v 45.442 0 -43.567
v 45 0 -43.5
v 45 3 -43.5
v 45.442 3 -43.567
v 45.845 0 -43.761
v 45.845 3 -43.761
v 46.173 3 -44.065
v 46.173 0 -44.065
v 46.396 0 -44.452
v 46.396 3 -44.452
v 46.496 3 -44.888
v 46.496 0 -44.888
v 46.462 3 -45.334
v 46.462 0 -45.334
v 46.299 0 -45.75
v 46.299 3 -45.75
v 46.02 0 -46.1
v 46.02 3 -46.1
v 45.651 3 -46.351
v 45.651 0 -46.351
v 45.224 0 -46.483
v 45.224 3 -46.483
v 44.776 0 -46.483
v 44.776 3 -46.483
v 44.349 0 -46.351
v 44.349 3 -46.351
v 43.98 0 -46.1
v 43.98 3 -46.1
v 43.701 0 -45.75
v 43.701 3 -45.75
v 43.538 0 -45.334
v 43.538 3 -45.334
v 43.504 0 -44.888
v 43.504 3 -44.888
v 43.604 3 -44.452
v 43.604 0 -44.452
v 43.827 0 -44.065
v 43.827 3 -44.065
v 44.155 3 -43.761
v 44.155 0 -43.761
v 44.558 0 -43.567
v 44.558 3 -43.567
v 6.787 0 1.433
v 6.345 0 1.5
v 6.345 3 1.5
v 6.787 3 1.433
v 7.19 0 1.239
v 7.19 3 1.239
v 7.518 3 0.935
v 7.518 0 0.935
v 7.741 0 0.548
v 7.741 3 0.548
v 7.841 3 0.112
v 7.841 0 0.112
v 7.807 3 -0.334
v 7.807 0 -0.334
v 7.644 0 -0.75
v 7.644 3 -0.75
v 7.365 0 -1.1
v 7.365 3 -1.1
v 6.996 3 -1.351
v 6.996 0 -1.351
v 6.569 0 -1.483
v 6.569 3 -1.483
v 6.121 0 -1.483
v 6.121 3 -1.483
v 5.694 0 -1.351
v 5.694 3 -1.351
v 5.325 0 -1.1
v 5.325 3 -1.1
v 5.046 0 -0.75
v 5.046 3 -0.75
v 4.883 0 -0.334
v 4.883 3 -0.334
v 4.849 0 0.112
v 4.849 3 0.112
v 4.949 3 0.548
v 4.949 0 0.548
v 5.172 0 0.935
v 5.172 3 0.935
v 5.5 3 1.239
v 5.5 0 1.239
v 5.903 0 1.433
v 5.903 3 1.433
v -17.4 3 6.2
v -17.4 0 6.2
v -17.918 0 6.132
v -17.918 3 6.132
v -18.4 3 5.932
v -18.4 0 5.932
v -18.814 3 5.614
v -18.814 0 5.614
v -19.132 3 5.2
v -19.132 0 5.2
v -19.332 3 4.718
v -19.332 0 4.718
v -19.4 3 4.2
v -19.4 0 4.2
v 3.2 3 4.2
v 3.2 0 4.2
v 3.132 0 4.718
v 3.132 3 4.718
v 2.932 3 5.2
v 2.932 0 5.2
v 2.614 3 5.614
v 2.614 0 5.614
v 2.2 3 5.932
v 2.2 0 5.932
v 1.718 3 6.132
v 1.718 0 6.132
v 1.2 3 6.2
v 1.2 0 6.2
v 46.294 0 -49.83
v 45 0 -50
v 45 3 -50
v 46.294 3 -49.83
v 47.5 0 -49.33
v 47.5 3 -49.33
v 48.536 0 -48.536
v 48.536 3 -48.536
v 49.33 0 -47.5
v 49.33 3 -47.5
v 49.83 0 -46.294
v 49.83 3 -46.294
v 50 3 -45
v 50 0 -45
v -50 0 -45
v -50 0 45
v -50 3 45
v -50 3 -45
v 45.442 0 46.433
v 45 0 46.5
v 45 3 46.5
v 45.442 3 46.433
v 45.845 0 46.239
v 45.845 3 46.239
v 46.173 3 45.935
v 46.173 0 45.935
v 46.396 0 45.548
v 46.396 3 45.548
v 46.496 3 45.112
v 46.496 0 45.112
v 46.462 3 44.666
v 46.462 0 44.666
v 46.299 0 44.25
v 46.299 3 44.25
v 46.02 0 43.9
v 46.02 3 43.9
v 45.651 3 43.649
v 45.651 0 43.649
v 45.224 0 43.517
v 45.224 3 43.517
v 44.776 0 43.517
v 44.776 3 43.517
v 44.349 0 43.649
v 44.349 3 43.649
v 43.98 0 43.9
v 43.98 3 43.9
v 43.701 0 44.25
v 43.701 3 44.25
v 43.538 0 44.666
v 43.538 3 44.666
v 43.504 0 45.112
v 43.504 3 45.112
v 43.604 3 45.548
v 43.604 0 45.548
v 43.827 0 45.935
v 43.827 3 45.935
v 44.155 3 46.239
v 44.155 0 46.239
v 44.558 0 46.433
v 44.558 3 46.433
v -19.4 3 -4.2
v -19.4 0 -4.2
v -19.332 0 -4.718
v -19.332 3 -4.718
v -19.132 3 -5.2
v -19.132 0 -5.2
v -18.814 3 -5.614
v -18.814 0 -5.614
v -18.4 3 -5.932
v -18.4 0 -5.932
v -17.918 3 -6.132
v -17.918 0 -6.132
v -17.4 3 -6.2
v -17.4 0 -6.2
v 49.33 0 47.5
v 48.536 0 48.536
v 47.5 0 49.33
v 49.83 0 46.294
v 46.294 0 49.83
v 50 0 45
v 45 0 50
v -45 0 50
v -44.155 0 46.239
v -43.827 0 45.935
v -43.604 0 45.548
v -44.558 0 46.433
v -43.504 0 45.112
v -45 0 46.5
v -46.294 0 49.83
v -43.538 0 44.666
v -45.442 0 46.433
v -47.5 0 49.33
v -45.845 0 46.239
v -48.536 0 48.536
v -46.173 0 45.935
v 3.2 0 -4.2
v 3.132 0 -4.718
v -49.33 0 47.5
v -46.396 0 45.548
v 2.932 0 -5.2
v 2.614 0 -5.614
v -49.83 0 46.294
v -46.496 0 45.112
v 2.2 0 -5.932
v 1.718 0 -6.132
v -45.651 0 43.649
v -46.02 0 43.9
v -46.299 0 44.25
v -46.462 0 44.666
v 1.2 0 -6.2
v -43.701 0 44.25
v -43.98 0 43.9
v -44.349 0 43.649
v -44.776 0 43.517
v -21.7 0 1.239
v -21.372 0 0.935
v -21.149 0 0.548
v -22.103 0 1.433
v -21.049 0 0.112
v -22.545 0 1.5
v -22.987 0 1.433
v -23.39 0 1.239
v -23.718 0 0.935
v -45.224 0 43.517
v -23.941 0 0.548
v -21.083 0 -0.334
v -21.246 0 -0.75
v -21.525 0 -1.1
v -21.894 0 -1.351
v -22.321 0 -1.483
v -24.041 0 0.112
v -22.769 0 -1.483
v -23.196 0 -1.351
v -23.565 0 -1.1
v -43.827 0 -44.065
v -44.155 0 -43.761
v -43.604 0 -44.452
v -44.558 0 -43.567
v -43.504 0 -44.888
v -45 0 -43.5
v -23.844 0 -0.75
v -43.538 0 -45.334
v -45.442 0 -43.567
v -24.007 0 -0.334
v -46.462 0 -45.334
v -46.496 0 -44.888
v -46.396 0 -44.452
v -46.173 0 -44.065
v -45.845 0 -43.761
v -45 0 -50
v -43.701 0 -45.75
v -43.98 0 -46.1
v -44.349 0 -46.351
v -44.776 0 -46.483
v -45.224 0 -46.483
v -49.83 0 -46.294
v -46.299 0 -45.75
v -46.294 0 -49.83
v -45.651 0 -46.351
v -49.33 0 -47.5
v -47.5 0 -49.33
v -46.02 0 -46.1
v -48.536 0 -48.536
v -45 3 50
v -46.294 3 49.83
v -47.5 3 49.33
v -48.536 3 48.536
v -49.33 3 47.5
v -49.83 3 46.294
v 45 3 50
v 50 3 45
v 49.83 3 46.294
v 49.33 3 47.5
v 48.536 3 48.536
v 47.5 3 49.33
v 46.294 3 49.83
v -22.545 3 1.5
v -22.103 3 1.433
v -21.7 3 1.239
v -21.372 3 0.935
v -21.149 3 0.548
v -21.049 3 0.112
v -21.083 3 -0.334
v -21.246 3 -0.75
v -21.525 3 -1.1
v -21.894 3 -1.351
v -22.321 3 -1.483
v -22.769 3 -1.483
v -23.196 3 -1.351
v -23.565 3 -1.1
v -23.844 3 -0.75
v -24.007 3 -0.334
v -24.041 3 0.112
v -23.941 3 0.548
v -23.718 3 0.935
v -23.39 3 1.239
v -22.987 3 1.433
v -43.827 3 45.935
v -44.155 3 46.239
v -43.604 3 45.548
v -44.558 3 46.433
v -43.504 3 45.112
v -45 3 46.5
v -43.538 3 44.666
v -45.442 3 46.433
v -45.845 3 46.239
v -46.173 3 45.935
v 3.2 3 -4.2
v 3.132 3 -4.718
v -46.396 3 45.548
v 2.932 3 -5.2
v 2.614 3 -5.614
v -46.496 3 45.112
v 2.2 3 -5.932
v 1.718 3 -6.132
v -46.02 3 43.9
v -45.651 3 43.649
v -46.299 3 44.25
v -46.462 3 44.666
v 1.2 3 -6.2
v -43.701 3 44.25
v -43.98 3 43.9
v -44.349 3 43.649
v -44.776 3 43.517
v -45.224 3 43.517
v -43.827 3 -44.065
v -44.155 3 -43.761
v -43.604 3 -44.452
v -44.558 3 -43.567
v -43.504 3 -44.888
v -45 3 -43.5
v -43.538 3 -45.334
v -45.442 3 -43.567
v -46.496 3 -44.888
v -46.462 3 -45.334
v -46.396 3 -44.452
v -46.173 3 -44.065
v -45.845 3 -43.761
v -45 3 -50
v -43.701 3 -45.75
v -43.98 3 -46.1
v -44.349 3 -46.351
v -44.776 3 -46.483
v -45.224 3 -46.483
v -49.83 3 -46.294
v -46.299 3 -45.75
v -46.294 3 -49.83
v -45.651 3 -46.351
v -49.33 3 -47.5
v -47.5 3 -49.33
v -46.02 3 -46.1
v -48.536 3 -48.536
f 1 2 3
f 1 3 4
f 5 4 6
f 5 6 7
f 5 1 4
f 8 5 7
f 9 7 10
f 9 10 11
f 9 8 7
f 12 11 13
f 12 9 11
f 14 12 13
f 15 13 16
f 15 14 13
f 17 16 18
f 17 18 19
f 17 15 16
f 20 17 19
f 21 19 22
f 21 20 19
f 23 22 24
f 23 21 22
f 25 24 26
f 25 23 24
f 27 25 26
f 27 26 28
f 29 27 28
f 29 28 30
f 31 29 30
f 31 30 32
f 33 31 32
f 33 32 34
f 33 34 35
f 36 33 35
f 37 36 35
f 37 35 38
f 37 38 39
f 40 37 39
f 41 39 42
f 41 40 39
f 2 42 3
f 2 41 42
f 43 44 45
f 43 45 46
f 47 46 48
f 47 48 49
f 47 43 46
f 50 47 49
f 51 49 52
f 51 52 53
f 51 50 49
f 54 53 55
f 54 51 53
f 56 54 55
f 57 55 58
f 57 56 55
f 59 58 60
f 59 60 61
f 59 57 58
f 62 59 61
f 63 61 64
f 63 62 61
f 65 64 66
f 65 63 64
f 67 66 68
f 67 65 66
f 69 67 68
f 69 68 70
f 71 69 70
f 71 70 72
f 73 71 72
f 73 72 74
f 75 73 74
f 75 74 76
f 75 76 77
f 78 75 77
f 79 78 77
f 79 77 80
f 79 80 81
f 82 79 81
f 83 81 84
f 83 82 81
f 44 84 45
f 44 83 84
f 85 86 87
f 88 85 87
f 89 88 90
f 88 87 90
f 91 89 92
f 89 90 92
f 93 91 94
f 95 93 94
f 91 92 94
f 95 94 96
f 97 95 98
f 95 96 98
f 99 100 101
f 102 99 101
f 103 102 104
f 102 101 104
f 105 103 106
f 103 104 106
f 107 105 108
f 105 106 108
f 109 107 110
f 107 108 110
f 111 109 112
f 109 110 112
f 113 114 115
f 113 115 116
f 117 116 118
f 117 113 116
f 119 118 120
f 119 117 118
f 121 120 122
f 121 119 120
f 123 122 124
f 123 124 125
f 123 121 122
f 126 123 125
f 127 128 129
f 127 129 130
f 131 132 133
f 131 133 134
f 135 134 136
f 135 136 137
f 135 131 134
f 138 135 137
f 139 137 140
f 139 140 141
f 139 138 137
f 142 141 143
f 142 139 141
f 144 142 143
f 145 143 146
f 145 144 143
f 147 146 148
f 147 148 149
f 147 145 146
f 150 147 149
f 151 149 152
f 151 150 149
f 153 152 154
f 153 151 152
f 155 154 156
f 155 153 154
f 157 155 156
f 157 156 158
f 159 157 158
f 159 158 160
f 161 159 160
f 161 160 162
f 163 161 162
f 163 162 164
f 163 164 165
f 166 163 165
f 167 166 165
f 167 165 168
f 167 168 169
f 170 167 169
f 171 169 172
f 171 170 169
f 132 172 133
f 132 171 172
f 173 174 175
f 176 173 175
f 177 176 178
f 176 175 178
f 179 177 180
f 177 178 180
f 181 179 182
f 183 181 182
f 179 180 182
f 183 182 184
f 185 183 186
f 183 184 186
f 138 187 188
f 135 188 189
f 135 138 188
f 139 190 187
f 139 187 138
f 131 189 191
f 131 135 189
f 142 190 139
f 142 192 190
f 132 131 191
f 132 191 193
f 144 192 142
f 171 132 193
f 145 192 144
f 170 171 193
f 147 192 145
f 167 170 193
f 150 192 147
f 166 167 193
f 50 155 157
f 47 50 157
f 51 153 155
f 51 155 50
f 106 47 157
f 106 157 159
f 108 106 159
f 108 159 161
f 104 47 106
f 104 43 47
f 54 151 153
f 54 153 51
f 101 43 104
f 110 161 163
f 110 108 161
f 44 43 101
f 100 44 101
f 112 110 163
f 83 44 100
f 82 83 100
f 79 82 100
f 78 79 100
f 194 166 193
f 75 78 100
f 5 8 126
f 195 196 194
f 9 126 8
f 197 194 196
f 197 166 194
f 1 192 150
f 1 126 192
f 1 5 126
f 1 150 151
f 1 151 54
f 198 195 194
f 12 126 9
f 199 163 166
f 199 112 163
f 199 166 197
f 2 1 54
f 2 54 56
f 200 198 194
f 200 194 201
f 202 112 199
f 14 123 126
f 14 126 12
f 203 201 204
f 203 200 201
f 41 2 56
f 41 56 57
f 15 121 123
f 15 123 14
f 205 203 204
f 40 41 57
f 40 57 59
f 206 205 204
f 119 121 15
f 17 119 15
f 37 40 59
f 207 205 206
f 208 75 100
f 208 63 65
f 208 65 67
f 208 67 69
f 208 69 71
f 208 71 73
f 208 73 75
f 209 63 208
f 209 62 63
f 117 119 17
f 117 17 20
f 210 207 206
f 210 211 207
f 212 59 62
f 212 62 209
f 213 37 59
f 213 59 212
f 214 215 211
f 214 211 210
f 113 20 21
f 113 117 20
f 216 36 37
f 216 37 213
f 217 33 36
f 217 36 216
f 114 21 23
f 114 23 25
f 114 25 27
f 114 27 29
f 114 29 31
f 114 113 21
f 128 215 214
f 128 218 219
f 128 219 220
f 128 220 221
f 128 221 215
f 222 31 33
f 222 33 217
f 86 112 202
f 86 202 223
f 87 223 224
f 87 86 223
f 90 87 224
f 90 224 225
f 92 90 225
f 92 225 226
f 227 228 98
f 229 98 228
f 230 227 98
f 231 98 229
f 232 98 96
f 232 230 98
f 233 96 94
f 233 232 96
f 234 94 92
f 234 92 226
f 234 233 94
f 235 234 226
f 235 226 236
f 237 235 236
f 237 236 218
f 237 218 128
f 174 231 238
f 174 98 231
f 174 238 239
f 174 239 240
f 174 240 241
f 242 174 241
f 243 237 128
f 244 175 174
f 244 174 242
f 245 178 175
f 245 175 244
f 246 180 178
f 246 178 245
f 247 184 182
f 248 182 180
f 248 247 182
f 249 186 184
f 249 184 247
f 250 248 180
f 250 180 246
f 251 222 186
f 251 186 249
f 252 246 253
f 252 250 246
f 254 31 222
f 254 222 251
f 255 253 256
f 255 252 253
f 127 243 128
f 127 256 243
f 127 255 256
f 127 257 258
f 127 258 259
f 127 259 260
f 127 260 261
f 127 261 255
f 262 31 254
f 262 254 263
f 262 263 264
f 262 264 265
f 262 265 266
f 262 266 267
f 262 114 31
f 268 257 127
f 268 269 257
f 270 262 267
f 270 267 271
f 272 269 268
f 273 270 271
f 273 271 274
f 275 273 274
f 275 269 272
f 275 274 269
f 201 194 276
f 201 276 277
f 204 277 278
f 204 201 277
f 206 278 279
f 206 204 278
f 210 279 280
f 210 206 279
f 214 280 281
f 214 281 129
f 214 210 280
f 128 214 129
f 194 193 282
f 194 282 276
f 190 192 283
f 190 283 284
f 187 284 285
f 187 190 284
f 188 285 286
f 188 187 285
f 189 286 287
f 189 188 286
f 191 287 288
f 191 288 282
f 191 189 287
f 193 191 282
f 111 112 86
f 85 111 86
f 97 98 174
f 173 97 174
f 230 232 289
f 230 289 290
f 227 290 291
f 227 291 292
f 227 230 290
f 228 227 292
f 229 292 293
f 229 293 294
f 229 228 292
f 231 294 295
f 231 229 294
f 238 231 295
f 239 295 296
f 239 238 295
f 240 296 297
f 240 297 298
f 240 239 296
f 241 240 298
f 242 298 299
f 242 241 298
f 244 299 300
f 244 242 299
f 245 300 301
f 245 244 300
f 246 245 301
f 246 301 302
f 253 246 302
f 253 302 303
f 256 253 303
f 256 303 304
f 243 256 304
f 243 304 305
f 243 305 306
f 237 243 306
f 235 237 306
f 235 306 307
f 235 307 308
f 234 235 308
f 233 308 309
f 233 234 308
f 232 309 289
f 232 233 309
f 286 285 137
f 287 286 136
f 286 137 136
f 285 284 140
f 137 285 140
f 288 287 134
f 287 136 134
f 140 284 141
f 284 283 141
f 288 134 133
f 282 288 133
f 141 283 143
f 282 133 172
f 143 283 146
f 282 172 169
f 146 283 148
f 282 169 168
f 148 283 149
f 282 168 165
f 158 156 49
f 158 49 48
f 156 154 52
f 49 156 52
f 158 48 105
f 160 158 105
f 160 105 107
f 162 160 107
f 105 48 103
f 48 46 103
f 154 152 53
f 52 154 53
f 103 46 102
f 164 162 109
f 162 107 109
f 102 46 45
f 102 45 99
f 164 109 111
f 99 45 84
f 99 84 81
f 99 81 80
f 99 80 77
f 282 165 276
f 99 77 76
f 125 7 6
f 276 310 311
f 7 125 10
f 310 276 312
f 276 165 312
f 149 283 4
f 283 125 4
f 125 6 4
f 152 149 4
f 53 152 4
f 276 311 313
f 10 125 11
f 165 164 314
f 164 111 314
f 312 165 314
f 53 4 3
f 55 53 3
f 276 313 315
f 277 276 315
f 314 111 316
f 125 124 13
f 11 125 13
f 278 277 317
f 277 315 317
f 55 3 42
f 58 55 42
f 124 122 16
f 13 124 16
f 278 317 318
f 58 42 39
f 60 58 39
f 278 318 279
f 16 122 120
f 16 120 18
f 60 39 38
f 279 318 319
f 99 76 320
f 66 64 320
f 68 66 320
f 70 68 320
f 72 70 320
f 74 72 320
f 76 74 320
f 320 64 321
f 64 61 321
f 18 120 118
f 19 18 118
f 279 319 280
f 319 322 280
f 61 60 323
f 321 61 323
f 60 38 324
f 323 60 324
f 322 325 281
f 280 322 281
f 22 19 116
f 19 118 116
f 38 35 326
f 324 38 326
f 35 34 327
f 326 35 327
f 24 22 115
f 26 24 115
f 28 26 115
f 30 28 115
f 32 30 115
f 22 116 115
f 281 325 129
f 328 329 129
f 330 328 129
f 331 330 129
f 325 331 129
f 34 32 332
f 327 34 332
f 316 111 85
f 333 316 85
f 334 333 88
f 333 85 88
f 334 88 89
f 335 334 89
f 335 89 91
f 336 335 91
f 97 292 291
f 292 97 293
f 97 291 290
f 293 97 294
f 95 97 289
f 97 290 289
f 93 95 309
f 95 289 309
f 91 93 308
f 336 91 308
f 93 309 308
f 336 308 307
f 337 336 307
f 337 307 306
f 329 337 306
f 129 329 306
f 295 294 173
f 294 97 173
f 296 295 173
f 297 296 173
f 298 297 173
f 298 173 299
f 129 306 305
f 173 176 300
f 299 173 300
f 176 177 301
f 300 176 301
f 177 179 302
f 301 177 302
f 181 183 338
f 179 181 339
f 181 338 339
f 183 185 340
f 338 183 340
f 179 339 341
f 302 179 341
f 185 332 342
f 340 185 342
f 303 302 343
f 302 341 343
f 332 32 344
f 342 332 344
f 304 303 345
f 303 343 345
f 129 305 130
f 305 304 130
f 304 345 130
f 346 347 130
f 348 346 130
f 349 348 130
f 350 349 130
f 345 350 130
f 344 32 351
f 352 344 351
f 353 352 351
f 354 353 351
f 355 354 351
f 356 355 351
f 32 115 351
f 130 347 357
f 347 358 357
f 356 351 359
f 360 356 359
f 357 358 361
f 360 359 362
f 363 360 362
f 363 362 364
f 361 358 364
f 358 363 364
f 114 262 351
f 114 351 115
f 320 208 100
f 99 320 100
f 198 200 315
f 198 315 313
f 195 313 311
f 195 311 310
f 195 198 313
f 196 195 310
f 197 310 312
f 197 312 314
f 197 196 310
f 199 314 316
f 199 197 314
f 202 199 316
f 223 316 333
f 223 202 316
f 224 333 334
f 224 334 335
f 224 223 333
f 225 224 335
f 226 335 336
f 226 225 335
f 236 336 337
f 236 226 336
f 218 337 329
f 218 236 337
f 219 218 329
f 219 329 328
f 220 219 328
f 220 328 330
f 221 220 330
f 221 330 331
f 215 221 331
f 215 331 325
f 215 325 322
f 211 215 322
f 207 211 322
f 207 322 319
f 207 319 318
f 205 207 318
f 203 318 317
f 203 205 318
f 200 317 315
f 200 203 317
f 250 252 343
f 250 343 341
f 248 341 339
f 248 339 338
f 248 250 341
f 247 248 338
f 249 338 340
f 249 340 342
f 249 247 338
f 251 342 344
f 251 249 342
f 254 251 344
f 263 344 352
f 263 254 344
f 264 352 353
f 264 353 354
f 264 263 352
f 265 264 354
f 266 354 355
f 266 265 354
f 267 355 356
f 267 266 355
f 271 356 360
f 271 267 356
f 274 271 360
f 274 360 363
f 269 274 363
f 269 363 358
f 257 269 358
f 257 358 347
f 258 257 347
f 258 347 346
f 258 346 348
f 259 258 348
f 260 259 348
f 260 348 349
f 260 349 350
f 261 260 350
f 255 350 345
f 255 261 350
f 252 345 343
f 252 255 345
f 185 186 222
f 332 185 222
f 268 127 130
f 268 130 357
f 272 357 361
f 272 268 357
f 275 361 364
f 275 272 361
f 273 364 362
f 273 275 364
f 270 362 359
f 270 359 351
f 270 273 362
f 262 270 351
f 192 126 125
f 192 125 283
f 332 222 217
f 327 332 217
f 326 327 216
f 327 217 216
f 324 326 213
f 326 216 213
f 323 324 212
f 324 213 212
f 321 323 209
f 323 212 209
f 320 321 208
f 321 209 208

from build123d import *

# Parameters (mm, degrees)
SKETCH_1_R      = 1.5
EXTRUDE_1_DEPTH = 3


with BuildPart() as part:
    # 草图1 → 凸台-拉伸1 (new body)
    with BuildSketch(Plane(origin=(0, 0, 0), x_dir=(1, 0, 0), z_dir=(0, 1, 0))):
        with BuildLine():
            Line((-45, 50), (45, 50))
            ThreePointArc((45, 50), (48.535533906, 48.535533906), (50, 45))
            Line((50, 45), (50, -45))
            ThreePointArc((50, -45), (48.535533906, -48.535533906), (45, -50))
            Line((45, -50), (-45, -50))
            ThreePointArc((-45, -50), (-48.535533906, -48.535533906), (-50, -45))
            Line((-50, -45), (-50, 45))
            ThreePointArc((-50, 45), (-48.535533906, 48.535533906), (-45, 50))
        make_face()
        with Locations(Location((-45, 45, 0), (0, 0, 270))):
            Circle(SKETCH_1_R, mode=Mode.SUBTRACT)
        with Locations(Location((45, 45, 0), (0, 0, 270))):
            Circle(SKETCH_1_R, mode=Mode.SUBTRACT)
        with Locations(Location((-45, -45, 0), (0, 0, 270))):
            Circle(SKETCH_1_R, mode=Mode.SUBTRACT)
        with Locations(Location((45, -45, 0), (0, 0, 270))):
            Circle(SKETCH_1_R, mode=Mode.SUBTRACT)
        with Locations(Location((6.345, 0, 0), (0, 0, 270))):
            Circle(SKETCH_1_R, mode=Mode.SUBTRACT)
        with Locations(Location((-22.545, 0, 0), (0, 0, 270))):
            Circle(SKETCH_1_R, mode=Mode.SUBTRACT)
        with BuildLine():
            Line((-17.4, 6.2), (1.2, 6.2))
            ThreePointArc((1.2, 6.2), (2.614213562, 5.614213562), (3.2, 4.2))
            Line((3.2, 4.2), (3.2, -4.2))
            ThreePointArc((3.2, -4.2), (2.614213562, -5.614213562), (1.2, -6.2))
            Line((1.2, -6.2), (-17.4, -6.2))
            ThreePointArc((-17.4, -6.2), (-18.814213562, -5.614213562), (-19.4, -4.2))
            Line((-19.4, -4.2), (-19.4, 4.2))
            ThreePointArc((-19.4, 4.2), (-18.814213562, 5.614213562), (-17.4, 6.2))
        make_face(mode=Mode.SUBTRACT)
    extrude(amount=EXTRUDE_1_DEPTH)


solid = part.part
